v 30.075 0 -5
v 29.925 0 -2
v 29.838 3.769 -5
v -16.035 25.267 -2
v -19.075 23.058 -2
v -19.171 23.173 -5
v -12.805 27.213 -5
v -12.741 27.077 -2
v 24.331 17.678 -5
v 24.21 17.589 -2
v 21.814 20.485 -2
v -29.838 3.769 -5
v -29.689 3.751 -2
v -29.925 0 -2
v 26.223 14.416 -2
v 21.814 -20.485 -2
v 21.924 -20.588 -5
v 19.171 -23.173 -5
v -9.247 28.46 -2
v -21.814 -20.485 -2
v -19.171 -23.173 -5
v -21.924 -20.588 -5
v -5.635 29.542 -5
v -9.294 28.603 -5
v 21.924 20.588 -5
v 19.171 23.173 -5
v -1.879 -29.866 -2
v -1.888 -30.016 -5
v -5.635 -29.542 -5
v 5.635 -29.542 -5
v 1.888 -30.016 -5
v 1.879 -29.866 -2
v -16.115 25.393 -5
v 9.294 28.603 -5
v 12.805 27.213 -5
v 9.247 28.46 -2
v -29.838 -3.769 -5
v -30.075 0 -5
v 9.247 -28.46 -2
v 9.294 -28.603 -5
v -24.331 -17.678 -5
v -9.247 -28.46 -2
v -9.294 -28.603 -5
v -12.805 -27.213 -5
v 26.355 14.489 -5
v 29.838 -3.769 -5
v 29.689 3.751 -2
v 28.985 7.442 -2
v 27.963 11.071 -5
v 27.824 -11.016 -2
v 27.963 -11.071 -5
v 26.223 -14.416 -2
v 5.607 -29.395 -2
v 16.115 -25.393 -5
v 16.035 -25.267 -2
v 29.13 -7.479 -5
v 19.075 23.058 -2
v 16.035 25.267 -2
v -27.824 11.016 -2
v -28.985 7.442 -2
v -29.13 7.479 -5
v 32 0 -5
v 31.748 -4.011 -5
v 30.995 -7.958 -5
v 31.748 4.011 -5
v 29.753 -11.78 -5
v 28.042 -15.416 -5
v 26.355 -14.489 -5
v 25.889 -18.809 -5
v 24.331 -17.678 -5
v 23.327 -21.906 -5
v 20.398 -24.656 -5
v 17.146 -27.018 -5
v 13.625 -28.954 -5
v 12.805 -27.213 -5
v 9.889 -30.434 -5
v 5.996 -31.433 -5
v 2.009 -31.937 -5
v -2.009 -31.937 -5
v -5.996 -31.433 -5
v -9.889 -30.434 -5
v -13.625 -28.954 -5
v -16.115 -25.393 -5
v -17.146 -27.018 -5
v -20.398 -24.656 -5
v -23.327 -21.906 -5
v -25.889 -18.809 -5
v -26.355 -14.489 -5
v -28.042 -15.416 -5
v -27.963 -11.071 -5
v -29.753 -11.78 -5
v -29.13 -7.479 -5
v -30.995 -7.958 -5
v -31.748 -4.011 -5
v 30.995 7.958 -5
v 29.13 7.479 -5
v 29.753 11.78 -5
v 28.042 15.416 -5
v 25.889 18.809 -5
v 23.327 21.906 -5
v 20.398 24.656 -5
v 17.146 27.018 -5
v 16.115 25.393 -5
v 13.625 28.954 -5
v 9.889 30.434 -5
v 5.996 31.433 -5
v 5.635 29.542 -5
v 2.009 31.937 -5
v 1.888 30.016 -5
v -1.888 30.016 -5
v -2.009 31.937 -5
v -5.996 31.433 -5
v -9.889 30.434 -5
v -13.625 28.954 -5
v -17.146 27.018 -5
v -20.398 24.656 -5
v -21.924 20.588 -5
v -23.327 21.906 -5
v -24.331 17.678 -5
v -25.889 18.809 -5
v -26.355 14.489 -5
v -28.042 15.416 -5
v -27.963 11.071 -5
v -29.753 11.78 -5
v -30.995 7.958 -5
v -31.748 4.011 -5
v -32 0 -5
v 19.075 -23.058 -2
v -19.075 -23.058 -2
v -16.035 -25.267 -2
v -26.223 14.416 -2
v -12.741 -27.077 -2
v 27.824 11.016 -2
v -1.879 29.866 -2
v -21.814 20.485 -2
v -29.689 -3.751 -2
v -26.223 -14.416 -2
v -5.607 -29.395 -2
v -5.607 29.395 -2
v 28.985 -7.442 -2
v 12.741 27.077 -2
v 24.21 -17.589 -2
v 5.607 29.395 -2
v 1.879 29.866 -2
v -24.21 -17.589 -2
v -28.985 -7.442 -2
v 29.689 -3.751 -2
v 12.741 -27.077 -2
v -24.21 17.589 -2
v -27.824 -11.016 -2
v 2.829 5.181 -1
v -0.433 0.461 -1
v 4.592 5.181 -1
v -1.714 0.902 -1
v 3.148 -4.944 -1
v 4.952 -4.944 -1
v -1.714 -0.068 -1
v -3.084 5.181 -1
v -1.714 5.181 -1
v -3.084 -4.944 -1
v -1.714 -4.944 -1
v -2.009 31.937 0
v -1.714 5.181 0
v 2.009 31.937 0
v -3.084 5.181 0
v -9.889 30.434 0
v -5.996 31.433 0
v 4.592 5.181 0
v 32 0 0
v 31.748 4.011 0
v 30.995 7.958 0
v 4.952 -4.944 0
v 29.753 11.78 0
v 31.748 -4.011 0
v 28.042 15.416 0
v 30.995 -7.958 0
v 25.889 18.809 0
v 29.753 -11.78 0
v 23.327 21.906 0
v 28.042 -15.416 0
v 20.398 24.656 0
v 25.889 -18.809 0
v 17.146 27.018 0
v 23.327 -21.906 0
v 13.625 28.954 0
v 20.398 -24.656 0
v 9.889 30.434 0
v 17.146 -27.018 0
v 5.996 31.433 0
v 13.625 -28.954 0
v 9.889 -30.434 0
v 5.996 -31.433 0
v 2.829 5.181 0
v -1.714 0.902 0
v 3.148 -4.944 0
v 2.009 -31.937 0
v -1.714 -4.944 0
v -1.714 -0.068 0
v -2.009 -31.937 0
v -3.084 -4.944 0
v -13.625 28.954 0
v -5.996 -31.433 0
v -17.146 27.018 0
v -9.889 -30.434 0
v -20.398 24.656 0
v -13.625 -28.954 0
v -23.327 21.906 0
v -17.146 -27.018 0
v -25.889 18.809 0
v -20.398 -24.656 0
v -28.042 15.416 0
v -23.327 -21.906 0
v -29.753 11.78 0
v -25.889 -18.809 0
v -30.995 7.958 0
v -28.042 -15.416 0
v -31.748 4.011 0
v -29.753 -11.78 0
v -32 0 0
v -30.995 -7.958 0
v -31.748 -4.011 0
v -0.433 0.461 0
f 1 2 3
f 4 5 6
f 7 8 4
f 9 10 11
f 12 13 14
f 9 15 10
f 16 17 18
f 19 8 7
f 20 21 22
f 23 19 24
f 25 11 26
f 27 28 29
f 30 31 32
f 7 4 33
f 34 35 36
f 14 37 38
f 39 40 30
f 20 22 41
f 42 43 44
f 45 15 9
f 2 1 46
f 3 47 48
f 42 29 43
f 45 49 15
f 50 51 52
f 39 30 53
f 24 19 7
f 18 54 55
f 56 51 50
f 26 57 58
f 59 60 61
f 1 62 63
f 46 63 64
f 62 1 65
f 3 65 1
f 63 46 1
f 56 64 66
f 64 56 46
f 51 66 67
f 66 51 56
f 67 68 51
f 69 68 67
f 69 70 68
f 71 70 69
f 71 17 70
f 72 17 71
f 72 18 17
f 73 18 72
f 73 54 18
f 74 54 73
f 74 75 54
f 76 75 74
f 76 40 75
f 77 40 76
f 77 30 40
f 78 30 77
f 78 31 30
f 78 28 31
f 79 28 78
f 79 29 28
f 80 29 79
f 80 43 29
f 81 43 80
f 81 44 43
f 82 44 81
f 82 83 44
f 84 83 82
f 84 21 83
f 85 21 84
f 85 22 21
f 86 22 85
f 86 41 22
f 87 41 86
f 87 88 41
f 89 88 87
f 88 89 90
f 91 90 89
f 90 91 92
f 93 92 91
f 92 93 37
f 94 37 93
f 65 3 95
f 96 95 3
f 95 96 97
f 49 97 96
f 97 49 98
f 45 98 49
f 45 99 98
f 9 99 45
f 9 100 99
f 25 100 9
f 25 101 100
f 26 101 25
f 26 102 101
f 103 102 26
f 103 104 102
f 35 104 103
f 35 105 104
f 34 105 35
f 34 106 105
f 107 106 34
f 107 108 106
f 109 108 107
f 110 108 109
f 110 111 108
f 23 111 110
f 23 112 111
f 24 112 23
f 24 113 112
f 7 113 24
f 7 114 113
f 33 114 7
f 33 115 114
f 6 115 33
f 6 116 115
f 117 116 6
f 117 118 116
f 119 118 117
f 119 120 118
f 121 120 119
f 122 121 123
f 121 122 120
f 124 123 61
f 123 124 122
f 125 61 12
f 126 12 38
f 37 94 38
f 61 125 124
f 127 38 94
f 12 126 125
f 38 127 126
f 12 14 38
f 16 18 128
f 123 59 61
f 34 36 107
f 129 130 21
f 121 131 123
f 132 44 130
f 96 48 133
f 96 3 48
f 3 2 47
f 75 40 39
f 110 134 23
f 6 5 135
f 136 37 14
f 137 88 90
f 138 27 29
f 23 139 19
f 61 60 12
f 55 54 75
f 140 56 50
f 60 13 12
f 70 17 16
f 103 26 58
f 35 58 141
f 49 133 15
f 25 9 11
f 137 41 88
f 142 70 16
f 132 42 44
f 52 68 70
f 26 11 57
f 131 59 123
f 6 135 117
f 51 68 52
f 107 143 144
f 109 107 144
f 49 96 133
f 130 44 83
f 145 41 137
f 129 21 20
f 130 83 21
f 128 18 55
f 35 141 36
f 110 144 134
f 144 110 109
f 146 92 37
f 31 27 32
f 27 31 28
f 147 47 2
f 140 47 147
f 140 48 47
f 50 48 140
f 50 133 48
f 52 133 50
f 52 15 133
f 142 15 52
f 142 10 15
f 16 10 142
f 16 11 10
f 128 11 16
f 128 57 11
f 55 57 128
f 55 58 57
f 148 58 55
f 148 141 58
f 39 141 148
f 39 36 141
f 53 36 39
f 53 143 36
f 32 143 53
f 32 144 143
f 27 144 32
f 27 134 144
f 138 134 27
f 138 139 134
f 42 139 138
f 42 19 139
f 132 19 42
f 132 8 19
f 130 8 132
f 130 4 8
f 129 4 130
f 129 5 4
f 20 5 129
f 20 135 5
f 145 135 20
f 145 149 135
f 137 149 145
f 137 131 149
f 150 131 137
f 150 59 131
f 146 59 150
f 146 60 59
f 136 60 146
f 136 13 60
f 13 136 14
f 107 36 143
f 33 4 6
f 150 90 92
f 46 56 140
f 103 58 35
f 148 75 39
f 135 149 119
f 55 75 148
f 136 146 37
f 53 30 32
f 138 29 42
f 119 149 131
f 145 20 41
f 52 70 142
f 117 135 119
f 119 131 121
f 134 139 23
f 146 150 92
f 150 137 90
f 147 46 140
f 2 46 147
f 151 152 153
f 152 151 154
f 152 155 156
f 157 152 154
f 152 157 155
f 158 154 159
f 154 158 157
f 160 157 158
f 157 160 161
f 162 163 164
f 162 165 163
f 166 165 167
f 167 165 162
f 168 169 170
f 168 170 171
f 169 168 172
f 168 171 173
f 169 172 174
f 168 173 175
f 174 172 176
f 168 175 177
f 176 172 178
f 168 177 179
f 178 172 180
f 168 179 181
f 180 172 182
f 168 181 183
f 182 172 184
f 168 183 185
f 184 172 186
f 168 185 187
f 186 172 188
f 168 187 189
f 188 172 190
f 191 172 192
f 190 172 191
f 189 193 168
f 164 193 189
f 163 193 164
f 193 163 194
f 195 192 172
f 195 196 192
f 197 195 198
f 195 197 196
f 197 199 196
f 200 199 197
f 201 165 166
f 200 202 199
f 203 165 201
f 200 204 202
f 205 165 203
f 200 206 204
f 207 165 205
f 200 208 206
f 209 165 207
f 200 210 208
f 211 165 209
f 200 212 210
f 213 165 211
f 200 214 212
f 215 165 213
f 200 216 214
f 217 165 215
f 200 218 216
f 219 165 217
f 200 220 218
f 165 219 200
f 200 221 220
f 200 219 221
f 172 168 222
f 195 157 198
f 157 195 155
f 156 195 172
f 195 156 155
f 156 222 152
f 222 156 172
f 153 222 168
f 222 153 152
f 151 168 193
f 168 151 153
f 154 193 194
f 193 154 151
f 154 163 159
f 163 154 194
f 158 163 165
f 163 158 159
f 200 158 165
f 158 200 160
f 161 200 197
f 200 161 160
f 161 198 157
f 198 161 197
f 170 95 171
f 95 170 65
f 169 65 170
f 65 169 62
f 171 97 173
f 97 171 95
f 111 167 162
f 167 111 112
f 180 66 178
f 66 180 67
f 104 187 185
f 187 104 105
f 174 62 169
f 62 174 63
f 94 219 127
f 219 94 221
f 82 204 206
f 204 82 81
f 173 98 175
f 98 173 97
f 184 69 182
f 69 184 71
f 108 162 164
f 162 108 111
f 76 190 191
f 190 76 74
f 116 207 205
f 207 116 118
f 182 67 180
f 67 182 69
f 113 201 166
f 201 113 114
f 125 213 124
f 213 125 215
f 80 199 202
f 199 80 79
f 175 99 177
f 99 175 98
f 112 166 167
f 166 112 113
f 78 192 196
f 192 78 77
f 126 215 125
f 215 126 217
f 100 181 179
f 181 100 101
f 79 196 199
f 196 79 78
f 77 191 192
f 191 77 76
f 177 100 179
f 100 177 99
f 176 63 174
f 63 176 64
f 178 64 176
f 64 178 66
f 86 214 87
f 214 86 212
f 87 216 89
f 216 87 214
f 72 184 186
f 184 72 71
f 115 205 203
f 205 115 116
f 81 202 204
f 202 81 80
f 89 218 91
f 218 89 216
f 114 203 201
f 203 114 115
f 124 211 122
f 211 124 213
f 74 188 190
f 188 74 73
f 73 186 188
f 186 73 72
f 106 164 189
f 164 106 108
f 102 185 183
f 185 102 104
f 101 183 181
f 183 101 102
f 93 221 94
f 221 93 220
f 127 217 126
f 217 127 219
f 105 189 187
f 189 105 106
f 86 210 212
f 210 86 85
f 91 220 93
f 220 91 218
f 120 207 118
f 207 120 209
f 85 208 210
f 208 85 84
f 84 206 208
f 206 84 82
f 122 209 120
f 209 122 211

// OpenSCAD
$fn = 50;

difference() {
	union() {
		translate(v = [0, 0, -5.0]) {
			cylinder(h = 5, r = 32.0);
		}
	}
	union() {
		#translate(v = [0, 0, -5.0]) {
			cylinder(h = 3, r1 = 30.075, r2 = 29.925);
		}
		translate(v = [0, 0, -1]) {
			linear_extrude(height = 1) {
				text(font = "Impact", halign = "center", size = 10, text = "K", valign = "center");
			}
		}
	}
}
